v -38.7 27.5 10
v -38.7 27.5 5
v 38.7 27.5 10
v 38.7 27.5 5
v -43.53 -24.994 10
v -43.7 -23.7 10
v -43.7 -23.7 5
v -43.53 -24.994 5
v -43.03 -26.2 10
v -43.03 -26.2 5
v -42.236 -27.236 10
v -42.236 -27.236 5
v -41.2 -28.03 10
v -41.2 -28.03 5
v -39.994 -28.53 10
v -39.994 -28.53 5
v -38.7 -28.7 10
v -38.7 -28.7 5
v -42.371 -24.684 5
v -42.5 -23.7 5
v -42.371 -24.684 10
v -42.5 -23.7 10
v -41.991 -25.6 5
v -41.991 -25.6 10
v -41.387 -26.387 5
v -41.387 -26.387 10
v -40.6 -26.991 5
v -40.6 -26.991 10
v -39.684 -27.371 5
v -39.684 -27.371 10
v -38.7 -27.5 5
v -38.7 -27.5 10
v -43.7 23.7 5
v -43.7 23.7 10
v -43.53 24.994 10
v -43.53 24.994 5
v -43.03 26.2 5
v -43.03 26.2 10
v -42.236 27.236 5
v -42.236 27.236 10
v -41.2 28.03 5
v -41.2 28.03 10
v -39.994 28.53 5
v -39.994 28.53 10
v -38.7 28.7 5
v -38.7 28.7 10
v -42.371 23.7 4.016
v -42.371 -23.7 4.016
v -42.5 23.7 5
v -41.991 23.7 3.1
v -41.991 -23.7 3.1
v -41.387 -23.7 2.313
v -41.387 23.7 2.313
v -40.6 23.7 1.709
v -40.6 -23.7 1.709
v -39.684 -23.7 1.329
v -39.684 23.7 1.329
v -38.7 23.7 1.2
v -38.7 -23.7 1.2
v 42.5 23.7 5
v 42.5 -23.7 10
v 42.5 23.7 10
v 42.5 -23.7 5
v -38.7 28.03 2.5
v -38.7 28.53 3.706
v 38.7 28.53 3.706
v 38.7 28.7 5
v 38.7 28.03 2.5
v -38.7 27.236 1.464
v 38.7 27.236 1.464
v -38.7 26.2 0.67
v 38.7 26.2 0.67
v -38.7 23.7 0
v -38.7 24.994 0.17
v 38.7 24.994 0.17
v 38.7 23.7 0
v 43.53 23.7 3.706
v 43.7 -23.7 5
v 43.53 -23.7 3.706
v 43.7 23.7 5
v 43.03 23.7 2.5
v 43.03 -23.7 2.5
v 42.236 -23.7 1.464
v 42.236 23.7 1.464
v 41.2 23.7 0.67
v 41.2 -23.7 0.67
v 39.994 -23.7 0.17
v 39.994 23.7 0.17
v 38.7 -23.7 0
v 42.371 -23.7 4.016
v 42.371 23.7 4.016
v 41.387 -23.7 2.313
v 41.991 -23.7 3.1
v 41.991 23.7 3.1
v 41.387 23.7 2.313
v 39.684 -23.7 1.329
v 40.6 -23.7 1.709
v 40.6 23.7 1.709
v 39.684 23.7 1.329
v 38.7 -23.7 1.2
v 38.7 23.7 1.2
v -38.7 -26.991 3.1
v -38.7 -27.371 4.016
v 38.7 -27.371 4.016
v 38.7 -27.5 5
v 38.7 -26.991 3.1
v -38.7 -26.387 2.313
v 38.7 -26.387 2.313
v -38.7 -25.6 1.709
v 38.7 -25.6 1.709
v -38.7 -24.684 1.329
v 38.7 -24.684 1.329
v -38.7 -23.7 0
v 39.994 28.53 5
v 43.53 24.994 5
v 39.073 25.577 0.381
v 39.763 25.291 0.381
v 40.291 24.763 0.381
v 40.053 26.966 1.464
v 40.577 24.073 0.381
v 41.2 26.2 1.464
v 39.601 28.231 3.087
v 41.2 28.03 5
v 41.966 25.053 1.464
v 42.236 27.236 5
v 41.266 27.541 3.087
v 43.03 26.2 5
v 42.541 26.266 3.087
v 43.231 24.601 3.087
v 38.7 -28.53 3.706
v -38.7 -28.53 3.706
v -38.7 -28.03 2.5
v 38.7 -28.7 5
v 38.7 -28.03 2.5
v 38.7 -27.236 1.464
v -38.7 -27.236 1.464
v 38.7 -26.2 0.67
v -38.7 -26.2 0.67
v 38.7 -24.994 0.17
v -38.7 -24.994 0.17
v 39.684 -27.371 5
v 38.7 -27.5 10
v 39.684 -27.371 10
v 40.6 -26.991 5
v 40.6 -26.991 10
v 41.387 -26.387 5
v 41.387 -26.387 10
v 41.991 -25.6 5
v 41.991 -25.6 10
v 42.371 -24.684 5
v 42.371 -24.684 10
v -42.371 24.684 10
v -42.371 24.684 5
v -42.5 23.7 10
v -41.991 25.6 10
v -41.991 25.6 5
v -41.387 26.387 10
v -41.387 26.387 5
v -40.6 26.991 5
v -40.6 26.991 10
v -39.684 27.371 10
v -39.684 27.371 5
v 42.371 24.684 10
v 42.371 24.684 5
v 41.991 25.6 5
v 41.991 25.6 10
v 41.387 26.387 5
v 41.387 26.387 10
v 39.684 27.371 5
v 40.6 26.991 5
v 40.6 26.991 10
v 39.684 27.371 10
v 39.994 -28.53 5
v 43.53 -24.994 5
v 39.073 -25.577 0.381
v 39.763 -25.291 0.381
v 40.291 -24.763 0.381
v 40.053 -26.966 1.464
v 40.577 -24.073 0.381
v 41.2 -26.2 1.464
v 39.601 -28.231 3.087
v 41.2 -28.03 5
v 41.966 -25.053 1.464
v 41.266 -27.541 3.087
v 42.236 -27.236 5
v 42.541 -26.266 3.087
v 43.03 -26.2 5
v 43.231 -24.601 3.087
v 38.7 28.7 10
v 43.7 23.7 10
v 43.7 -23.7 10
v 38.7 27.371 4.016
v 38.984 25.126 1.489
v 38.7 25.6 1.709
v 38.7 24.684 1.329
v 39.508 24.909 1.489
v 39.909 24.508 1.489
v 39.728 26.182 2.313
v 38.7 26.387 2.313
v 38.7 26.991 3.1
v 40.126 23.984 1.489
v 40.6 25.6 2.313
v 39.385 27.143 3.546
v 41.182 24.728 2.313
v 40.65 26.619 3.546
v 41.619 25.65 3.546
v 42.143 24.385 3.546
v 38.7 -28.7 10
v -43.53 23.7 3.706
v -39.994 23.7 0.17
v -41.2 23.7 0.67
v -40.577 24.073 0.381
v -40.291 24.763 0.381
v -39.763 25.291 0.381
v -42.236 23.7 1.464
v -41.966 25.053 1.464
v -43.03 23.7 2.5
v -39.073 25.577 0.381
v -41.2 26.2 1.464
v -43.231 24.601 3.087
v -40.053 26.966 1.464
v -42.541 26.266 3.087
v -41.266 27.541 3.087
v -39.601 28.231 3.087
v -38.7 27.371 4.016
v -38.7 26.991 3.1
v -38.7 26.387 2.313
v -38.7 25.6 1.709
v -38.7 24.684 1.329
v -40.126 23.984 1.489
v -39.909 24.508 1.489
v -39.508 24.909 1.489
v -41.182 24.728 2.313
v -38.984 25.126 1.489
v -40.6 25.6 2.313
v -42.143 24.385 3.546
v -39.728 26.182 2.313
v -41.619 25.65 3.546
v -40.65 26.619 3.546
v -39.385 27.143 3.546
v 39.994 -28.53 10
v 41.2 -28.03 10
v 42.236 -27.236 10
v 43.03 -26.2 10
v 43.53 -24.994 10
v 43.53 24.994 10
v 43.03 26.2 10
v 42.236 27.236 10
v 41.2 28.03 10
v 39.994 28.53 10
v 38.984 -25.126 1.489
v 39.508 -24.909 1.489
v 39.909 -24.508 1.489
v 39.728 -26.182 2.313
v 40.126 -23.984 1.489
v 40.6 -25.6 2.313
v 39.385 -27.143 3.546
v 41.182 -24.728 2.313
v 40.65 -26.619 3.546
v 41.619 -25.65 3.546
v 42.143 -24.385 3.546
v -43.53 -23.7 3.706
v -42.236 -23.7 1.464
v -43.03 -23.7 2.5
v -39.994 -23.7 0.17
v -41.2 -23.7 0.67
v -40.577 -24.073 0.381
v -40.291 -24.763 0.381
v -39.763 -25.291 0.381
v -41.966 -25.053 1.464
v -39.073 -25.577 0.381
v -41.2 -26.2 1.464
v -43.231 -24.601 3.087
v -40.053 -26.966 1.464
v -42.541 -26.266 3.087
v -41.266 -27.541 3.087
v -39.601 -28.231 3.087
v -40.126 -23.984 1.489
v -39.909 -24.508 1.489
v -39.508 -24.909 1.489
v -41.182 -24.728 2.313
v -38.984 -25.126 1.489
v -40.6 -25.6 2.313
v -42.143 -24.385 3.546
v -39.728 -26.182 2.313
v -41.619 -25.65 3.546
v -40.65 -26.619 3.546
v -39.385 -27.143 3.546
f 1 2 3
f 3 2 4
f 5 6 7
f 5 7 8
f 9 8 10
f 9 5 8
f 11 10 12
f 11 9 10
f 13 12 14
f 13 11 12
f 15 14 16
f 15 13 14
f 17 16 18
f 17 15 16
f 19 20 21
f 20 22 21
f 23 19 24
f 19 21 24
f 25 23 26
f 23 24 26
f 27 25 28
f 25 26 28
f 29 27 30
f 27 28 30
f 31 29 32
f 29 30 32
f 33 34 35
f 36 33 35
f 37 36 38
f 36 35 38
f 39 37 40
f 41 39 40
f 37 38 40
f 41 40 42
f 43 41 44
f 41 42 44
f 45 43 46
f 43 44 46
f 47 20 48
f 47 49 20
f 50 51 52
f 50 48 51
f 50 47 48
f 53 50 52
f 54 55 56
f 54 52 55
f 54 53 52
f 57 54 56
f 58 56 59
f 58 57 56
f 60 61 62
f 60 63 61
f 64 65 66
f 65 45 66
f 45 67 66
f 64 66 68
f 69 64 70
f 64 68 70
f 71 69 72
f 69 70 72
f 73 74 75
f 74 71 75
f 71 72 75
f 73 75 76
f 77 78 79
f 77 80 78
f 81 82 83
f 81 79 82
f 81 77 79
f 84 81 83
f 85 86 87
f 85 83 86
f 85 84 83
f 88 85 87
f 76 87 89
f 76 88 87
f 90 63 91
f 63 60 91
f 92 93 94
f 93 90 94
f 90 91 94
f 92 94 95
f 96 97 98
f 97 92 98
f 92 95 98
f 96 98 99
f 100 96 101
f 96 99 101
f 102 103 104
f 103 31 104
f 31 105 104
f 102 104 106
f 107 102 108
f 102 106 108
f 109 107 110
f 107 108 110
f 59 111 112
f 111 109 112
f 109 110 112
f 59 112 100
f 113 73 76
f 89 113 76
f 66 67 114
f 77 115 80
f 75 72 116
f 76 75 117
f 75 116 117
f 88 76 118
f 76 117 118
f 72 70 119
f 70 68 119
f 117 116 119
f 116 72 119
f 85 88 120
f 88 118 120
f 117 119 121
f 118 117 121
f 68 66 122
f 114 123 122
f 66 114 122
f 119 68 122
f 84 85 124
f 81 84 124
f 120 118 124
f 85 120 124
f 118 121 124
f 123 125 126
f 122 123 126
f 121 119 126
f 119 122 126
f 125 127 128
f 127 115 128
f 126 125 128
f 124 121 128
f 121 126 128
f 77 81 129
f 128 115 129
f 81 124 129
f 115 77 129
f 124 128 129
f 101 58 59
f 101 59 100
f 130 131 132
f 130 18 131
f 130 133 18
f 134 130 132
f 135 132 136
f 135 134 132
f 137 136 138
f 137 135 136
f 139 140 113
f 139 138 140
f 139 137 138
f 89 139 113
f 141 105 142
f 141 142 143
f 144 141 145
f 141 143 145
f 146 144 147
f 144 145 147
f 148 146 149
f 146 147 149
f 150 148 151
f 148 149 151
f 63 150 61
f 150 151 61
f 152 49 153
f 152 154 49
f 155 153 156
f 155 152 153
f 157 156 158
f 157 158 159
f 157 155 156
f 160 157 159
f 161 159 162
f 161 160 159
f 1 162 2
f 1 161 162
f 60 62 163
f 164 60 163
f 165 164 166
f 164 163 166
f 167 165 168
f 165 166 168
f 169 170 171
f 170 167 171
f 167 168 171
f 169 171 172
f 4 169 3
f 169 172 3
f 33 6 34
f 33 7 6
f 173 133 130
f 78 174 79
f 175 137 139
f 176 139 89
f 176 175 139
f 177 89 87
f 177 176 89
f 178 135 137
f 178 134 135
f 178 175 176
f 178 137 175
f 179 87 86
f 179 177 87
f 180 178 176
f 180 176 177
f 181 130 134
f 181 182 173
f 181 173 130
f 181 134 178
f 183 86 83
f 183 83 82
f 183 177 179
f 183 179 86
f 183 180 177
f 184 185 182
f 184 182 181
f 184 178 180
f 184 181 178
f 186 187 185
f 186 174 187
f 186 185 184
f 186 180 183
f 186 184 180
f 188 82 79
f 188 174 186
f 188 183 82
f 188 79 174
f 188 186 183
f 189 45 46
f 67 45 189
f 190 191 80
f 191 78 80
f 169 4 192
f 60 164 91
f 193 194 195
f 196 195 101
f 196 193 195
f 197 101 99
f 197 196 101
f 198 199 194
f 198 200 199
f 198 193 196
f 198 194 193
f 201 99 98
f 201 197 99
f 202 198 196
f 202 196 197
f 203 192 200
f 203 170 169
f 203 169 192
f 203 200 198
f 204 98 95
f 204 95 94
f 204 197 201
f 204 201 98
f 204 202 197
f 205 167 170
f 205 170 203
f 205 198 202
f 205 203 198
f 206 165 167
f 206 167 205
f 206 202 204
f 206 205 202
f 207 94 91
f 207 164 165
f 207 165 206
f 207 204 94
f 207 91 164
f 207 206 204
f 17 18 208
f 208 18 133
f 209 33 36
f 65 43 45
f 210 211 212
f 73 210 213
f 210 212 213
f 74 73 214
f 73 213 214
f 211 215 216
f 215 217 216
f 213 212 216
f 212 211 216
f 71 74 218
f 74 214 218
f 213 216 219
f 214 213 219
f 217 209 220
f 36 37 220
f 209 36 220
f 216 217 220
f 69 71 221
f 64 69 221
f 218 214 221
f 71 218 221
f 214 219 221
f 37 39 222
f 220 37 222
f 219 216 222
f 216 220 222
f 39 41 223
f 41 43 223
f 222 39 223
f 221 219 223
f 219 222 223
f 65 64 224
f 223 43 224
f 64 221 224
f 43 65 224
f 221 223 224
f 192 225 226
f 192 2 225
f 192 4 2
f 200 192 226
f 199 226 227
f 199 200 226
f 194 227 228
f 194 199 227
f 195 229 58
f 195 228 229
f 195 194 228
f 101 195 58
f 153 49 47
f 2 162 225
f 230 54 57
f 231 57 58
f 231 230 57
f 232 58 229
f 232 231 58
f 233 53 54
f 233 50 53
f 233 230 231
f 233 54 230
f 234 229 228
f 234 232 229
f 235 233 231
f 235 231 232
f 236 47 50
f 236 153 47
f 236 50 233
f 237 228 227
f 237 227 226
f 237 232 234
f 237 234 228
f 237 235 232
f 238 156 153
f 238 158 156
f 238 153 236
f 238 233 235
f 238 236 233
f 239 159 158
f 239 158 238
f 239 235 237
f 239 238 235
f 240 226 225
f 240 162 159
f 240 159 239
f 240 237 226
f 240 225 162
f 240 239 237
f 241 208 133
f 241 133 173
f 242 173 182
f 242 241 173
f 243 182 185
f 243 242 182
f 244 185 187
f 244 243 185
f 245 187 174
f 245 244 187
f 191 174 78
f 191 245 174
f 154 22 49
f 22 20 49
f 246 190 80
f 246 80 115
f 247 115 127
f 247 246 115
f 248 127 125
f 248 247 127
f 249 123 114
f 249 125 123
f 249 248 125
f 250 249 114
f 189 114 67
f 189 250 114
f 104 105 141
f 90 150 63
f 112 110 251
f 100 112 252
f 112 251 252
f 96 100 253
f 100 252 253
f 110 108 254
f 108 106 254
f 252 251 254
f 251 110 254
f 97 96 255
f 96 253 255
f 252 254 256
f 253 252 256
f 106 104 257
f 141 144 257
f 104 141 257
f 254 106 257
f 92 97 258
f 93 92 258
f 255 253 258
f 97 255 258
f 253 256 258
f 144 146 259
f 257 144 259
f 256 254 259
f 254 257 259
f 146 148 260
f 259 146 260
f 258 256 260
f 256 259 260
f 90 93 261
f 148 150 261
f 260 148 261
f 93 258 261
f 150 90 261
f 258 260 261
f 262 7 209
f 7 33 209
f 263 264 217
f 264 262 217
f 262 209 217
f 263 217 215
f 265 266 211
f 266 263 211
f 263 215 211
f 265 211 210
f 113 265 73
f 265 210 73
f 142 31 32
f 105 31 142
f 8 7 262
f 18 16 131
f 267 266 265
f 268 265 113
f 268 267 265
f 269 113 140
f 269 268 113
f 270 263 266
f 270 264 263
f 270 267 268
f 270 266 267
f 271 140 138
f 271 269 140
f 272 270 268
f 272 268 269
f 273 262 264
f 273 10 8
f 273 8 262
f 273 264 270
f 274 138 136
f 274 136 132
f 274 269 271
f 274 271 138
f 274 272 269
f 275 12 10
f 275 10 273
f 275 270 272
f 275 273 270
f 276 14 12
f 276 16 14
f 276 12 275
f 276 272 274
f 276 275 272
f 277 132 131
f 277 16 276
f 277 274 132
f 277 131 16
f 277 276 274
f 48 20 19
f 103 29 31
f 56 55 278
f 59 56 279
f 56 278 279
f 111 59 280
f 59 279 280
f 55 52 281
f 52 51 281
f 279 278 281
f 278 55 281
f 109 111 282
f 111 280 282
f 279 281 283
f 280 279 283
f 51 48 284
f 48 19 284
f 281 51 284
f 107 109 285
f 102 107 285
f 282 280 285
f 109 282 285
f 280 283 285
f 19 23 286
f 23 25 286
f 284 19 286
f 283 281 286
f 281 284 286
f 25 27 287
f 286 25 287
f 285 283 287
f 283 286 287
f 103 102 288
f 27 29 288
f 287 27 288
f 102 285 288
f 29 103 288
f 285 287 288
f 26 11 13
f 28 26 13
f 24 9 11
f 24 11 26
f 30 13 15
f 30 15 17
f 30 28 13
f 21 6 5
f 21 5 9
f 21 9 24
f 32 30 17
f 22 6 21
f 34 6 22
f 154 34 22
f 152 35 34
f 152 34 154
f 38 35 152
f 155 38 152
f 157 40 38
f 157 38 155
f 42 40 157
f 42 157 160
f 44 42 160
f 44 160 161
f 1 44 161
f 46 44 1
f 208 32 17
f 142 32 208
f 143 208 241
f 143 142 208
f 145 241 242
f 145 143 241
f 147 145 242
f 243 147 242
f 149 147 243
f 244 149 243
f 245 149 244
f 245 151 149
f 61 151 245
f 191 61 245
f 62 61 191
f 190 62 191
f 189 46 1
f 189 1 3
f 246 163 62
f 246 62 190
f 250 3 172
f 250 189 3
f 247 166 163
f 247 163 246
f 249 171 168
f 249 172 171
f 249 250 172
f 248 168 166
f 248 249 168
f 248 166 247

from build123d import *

# Parameters (mm, degrees)
F0_W     = 87.4
F0_H     = 57.4
F1_DEPTH = 10
F2_R     = 5
F3_T     = -1.2


with BuildPart() as f1:
    # F0 (on Top) → F1 (new body)
    with BuildSketch(Plane.XY):
        Rectangle(F0_W, F0_H)
    extrude(amount=F1_DEPTH)

    # F2
    f2_edges = [f1.edges().sort_by_distance(p)[0] for p in [
        (43.7, -28.7, 5),
        (43.7, 28.7, 5),
        (-43.7, 28.7, 5),
        (-43.7, -28.7, 5),
        (-43.7, 0, 0),
        (0, 28.7, 0),
        (0, -28.7, 0),
        (43.7, 0, 0),
    ]]
    fillet(f2_edges, radius=F2_R)

    # F3
    f3_openings = [f1.faces().sort_by_distance(p)[0] for p in [
        (0, 0, 10),
    ]]
    offset(amount=F3_T, openings=f3_openings)


solid = f1.part
